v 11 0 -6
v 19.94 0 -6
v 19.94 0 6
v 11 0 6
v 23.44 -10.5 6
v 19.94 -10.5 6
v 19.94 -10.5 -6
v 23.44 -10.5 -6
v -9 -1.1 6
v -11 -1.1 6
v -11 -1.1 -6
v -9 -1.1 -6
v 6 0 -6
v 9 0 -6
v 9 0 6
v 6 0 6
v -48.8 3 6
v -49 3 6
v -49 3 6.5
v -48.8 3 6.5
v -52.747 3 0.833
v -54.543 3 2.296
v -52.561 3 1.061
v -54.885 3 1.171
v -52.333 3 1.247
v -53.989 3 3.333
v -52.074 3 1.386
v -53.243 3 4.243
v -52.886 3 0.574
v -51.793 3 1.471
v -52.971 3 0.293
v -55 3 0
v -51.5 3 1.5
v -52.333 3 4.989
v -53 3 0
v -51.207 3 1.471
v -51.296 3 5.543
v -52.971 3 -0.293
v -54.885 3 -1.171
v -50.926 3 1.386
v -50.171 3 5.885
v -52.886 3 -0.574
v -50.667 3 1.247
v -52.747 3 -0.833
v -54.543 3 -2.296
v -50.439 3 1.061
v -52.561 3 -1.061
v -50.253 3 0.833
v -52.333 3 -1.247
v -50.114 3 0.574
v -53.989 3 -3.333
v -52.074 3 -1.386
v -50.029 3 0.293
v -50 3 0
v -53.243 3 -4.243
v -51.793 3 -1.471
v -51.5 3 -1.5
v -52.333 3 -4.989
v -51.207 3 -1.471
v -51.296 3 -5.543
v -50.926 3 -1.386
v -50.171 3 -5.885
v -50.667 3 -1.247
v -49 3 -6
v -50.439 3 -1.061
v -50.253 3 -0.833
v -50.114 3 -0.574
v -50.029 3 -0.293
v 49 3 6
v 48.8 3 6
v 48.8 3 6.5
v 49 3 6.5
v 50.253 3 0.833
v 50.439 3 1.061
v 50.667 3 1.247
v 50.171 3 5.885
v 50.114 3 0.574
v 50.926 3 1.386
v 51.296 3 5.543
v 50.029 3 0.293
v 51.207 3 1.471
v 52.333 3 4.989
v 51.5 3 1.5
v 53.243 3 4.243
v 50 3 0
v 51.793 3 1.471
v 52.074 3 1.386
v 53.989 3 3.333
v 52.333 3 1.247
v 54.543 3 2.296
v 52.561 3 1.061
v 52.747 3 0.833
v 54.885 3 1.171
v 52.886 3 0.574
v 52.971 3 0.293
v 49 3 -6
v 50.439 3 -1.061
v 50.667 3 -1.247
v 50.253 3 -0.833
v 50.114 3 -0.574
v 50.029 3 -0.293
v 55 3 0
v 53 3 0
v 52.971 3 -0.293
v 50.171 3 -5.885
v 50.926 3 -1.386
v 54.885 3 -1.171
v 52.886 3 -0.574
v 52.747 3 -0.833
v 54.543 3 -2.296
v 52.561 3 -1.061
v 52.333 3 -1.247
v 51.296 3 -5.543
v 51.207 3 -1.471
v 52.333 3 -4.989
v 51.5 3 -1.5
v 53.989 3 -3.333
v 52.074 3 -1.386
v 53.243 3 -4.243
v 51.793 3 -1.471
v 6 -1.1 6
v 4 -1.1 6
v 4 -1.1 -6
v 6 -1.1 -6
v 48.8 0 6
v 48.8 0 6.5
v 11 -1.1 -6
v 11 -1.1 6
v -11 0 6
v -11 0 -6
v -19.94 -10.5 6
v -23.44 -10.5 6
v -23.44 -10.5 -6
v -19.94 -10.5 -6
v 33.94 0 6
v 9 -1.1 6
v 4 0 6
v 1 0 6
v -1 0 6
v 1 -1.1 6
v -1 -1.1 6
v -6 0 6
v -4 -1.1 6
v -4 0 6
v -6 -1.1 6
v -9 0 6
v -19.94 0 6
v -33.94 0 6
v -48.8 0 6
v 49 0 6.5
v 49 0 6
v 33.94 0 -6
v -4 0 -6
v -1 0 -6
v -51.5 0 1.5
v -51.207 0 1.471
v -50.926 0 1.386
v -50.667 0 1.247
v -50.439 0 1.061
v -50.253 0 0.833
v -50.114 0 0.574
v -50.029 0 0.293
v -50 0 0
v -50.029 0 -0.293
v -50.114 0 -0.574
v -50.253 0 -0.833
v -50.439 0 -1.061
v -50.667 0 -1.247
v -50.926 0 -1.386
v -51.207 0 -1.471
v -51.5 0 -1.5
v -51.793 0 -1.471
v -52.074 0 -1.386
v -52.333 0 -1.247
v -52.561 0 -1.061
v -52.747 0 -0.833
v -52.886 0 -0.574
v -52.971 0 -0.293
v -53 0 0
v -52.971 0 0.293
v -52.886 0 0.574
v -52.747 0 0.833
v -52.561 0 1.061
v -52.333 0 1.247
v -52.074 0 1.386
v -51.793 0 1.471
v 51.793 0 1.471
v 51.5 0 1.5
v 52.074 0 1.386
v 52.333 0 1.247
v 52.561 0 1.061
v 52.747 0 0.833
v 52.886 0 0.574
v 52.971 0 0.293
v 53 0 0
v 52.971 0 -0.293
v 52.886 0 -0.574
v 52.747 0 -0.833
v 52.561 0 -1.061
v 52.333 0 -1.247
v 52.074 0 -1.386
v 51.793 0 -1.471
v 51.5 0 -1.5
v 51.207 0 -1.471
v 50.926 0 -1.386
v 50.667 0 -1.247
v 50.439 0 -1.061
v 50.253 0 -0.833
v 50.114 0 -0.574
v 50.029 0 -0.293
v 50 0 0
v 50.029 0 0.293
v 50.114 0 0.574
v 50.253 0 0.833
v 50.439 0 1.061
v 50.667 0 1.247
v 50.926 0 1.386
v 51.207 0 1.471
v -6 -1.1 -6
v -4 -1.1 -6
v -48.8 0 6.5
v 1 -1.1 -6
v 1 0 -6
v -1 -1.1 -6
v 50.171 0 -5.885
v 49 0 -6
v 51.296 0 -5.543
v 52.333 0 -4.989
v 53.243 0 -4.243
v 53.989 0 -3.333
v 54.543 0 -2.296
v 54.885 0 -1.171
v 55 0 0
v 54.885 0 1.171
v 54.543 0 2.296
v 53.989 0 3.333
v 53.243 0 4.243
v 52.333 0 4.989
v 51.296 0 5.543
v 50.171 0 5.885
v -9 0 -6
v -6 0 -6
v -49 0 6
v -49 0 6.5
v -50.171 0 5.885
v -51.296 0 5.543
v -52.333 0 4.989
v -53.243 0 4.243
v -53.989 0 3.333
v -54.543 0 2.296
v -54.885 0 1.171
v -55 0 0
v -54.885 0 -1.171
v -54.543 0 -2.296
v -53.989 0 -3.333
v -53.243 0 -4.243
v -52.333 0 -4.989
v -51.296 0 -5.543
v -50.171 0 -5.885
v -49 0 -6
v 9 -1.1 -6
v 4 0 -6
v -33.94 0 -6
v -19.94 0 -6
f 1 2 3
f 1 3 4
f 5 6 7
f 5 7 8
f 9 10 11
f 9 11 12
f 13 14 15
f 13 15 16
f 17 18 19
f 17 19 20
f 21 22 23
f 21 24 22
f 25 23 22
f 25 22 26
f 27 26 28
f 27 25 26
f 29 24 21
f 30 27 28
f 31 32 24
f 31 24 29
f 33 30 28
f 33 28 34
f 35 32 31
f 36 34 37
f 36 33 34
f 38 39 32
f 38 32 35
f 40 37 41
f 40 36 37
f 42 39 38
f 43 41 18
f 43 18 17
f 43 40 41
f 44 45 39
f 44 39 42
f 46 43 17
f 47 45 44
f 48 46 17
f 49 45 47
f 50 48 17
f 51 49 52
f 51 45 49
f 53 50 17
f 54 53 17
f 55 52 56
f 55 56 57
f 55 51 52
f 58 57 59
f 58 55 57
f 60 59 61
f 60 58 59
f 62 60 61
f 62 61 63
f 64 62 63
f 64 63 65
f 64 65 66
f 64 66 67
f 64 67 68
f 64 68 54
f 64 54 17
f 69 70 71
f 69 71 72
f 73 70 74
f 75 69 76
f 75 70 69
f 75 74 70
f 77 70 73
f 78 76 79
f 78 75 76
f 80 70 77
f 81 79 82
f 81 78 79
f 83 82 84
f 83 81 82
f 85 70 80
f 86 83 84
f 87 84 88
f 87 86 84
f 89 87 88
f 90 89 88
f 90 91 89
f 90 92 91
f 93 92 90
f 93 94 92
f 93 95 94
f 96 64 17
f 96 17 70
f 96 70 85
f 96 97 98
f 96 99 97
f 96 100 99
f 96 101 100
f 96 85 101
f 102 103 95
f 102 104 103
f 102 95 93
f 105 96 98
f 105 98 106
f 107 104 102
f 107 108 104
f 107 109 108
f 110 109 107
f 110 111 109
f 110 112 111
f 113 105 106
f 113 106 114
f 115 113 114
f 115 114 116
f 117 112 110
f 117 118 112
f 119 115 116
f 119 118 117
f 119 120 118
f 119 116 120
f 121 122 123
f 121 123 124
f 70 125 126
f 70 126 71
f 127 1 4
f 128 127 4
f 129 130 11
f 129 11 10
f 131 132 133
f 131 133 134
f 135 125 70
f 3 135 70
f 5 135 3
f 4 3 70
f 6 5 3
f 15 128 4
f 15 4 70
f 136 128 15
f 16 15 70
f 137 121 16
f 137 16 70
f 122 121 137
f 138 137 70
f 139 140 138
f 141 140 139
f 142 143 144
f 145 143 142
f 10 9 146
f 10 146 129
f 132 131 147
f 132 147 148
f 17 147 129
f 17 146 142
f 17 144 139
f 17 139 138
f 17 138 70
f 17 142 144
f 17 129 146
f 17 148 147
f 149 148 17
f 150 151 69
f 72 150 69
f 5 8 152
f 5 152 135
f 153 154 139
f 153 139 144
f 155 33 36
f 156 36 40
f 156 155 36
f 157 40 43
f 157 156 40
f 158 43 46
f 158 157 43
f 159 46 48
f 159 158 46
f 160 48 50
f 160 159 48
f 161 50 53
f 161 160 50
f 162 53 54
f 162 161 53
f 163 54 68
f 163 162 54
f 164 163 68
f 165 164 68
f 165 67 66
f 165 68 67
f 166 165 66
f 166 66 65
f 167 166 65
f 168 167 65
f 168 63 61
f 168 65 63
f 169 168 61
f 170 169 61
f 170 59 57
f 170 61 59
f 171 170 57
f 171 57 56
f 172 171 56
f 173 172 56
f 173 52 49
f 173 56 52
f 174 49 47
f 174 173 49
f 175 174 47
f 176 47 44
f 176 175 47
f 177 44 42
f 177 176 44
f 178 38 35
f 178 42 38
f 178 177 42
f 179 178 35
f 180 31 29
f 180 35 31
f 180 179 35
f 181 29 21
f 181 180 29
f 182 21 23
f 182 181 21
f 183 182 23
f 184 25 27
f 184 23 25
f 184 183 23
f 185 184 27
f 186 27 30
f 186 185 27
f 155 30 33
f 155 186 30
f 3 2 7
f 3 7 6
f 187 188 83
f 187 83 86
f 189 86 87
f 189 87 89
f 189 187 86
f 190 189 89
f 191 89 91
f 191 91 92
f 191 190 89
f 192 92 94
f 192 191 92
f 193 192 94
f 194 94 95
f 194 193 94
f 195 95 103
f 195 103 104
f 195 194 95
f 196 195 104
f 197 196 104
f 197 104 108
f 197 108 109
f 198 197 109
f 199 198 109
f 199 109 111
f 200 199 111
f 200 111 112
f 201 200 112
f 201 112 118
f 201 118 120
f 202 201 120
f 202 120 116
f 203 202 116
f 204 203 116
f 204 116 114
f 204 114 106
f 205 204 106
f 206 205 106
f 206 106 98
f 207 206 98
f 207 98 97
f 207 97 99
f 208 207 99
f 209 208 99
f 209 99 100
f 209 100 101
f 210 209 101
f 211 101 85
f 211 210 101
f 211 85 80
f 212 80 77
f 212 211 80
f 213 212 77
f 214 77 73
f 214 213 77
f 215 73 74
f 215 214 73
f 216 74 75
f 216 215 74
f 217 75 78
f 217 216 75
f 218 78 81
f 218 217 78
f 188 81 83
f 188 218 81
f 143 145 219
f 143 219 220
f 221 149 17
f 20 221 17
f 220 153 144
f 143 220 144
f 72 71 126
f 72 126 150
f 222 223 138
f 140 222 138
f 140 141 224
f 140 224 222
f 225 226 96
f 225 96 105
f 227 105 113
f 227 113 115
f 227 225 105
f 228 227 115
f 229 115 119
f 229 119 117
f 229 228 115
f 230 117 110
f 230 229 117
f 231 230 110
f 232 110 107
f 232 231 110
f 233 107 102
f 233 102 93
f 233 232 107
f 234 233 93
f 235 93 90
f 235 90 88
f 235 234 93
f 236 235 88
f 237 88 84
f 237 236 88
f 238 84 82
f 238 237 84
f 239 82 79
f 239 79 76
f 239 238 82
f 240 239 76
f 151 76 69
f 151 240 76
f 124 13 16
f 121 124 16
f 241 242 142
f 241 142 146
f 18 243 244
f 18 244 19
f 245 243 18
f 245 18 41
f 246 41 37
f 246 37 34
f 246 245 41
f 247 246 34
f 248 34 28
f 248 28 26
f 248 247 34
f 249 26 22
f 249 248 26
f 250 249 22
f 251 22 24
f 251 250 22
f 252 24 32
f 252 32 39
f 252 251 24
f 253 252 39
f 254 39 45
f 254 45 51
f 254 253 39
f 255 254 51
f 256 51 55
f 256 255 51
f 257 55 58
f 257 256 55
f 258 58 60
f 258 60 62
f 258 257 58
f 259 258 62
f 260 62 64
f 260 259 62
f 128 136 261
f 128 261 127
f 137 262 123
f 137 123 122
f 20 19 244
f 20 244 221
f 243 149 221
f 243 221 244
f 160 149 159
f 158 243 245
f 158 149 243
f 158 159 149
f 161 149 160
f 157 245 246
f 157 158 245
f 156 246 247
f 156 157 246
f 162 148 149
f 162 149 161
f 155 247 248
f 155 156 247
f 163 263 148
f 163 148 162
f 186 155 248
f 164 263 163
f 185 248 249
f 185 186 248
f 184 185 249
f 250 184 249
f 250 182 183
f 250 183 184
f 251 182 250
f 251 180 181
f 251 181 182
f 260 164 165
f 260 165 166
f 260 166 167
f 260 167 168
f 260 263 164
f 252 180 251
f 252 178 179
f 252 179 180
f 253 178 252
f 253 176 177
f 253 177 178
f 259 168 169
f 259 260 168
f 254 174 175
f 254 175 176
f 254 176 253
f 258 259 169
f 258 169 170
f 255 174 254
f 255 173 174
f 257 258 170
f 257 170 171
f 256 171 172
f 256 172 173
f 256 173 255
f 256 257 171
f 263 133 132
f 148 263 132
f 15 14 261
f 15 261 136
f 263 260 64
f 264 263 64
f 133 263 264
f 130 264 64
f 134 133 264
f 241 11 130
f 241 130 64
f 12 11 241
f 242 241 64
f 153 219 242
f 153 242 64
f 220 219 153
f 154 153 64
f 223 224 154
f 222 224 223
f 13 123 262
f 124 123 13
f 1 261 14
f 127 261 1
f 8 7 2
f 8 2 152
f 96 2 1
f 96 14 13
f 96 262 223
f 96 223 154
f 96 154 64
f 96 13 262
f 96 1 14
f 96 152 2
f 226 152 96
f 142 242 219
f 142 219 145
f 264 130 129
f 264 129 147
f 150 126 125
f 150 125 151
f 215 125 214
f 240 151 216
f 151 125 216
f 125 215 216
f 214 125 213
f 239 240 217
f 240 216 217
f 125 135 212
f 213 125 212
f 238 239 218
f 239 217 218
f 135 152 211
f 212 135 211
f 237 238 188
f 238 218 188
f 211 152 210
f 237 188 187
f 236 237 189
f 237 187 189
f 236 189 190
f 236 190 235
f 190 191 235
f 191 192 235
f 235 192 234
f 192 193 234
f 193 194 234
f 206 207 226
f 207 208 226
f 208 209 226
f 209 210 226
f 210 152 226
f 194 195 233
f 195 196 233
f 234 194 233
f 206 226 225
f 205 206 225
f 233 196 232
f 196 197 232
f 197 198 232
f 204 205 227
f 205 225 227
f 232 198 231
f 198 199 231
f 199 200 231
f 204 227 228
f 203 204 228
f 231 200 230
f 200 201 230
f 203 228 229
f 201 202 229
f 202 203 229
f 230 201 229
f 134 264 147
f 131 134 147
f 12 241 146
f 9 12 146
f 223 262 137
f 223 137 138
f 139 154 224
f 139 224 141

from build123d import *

# Parameters (mm, degrees)
SKETCH1_R                 = 1.5
BOSS_EXTRUDE1_DEPTH       = 3
SKETCH4_W                 = 3.5
SKETCH4_H                 = 12
BOSS_EXTRUDE3_DEPTH       = 10.5
SKETCH5_W                 = 2
SKETCH5_H                 = 12
BOSS_EXTRUDE4_DEPTH       = 1.1
SKETCH6_W                 = 0.2
SKETCH6_H                 = 3
BOSS_EXTRUDE5_DEPTH       = 0.5
CHAMFER1_SIZE             = 10.5
F_3_0MM_DOWEL_HOLE1_D     = 3
F_3_0MM_DOWEL_HOLE1_DEPTH = 13.5


with BuildPart() as part:
    # Sketch1 → Boss-Extrude1 (new body)
    with BuildSketch(Plane(origin=(0, 0, 0), x_dir=(1, 0, 0), z_dir=(0, 1, 0))):
        with BuildLine():
            Line((-49, 6), (49, 6))
            ThreePointArc((49, 6), (55, 0), (49, -6))
            Line((49, -6), (-49, -6))
            ThreePointArc((-49, -6), (-55, 0), (-49, 6))
        make_face()
        with Locations(Location((-51.5, 0, 0), (0, 0, 270))):
            Circle(SKETCH1_R, mode=Mode.SUBTRACT)
        with Locations(Location((51.5, 0, 0), (0, 0, 270))):
            Circle(SKETCH1_R, mode=Mode.SUBTRACT)
    extrude(amount=BOSS_EXTRUDE1_DEPTH)

    # Sketch4 → Boss-Extrude3 (add)
    with BuildSketch(Plane.XZ):
        with Locations((-21.690023983, 0)):
            Rectangle(SKETCH4_W, SKETCH4_H)
        with Locations((21.690023983, 0)):
            Rectangle(SKETCH4_W, SKETCH4_H)
    extrude(amount=BOSS_EXTRUDE3_DEPTH)

    # Sketch5 → Boss-Extrude4 (add)
    with BuildSketch(Plane.XZ):
        with Locations((5, 0)):
            Rectangle(SKETCH5_W, SKETCH5_H)
        Rectangle(SKETCH5_W, SKETCH5_H)
        with Locations((10, 0)):
            Rectangle(SKETCH5_W, SKETCH5_H)
        with Locations((-5, 0)):
            Rectangle(SKETCH5_W, SKETCH5_H)
        with Locations((-10, 0)):
            Rectangle(SKETCH5_W, SKETCH5_H)
    extrude(amount=BOSS_EXTRUDE4_DEPTH)

    # Sketch6 → Boss-Extrude5 (add)
    with BuildSketch(Plane.XY.offset(6)):
        with Locations((48.9, 1.5)):
            Rectangle(SKETCH6_W, SKETCH6_H)
        with Locations((-48.9, 1.5)):
            Rectangle(SKETCH6_W, SKETCH6_H)
    extrude(amount=BOSS_EXTRUDE5_DEPTH)

    # Chamfer1
    chamfer1_edges = [part.edges().sort_by_distance(p)[0] for p in [
        (23.440023983, 0, 0),
        (-23.440023983, 0, 0),
    ]]
    chamfer(chamfer1_edges, length=CHAMFER1_SIZE - 0.0001)  # a hair under: the kernel refuses the full size

    # Ø3.0mm Dowel Hole1
    with Locations(Plane(origin=(0, 3, 0), x_dir=(1, 0, 0), z_dir=(0, 1, 0))):
        with Locations((-51.5, 0), (51.5, 0)):
            Hole(F_3_0MM_DOWEL_HOLE1_D / 2, depth=F_3_0MM_DOWEL_HOLE1_DEPTH)


solid = part.part
